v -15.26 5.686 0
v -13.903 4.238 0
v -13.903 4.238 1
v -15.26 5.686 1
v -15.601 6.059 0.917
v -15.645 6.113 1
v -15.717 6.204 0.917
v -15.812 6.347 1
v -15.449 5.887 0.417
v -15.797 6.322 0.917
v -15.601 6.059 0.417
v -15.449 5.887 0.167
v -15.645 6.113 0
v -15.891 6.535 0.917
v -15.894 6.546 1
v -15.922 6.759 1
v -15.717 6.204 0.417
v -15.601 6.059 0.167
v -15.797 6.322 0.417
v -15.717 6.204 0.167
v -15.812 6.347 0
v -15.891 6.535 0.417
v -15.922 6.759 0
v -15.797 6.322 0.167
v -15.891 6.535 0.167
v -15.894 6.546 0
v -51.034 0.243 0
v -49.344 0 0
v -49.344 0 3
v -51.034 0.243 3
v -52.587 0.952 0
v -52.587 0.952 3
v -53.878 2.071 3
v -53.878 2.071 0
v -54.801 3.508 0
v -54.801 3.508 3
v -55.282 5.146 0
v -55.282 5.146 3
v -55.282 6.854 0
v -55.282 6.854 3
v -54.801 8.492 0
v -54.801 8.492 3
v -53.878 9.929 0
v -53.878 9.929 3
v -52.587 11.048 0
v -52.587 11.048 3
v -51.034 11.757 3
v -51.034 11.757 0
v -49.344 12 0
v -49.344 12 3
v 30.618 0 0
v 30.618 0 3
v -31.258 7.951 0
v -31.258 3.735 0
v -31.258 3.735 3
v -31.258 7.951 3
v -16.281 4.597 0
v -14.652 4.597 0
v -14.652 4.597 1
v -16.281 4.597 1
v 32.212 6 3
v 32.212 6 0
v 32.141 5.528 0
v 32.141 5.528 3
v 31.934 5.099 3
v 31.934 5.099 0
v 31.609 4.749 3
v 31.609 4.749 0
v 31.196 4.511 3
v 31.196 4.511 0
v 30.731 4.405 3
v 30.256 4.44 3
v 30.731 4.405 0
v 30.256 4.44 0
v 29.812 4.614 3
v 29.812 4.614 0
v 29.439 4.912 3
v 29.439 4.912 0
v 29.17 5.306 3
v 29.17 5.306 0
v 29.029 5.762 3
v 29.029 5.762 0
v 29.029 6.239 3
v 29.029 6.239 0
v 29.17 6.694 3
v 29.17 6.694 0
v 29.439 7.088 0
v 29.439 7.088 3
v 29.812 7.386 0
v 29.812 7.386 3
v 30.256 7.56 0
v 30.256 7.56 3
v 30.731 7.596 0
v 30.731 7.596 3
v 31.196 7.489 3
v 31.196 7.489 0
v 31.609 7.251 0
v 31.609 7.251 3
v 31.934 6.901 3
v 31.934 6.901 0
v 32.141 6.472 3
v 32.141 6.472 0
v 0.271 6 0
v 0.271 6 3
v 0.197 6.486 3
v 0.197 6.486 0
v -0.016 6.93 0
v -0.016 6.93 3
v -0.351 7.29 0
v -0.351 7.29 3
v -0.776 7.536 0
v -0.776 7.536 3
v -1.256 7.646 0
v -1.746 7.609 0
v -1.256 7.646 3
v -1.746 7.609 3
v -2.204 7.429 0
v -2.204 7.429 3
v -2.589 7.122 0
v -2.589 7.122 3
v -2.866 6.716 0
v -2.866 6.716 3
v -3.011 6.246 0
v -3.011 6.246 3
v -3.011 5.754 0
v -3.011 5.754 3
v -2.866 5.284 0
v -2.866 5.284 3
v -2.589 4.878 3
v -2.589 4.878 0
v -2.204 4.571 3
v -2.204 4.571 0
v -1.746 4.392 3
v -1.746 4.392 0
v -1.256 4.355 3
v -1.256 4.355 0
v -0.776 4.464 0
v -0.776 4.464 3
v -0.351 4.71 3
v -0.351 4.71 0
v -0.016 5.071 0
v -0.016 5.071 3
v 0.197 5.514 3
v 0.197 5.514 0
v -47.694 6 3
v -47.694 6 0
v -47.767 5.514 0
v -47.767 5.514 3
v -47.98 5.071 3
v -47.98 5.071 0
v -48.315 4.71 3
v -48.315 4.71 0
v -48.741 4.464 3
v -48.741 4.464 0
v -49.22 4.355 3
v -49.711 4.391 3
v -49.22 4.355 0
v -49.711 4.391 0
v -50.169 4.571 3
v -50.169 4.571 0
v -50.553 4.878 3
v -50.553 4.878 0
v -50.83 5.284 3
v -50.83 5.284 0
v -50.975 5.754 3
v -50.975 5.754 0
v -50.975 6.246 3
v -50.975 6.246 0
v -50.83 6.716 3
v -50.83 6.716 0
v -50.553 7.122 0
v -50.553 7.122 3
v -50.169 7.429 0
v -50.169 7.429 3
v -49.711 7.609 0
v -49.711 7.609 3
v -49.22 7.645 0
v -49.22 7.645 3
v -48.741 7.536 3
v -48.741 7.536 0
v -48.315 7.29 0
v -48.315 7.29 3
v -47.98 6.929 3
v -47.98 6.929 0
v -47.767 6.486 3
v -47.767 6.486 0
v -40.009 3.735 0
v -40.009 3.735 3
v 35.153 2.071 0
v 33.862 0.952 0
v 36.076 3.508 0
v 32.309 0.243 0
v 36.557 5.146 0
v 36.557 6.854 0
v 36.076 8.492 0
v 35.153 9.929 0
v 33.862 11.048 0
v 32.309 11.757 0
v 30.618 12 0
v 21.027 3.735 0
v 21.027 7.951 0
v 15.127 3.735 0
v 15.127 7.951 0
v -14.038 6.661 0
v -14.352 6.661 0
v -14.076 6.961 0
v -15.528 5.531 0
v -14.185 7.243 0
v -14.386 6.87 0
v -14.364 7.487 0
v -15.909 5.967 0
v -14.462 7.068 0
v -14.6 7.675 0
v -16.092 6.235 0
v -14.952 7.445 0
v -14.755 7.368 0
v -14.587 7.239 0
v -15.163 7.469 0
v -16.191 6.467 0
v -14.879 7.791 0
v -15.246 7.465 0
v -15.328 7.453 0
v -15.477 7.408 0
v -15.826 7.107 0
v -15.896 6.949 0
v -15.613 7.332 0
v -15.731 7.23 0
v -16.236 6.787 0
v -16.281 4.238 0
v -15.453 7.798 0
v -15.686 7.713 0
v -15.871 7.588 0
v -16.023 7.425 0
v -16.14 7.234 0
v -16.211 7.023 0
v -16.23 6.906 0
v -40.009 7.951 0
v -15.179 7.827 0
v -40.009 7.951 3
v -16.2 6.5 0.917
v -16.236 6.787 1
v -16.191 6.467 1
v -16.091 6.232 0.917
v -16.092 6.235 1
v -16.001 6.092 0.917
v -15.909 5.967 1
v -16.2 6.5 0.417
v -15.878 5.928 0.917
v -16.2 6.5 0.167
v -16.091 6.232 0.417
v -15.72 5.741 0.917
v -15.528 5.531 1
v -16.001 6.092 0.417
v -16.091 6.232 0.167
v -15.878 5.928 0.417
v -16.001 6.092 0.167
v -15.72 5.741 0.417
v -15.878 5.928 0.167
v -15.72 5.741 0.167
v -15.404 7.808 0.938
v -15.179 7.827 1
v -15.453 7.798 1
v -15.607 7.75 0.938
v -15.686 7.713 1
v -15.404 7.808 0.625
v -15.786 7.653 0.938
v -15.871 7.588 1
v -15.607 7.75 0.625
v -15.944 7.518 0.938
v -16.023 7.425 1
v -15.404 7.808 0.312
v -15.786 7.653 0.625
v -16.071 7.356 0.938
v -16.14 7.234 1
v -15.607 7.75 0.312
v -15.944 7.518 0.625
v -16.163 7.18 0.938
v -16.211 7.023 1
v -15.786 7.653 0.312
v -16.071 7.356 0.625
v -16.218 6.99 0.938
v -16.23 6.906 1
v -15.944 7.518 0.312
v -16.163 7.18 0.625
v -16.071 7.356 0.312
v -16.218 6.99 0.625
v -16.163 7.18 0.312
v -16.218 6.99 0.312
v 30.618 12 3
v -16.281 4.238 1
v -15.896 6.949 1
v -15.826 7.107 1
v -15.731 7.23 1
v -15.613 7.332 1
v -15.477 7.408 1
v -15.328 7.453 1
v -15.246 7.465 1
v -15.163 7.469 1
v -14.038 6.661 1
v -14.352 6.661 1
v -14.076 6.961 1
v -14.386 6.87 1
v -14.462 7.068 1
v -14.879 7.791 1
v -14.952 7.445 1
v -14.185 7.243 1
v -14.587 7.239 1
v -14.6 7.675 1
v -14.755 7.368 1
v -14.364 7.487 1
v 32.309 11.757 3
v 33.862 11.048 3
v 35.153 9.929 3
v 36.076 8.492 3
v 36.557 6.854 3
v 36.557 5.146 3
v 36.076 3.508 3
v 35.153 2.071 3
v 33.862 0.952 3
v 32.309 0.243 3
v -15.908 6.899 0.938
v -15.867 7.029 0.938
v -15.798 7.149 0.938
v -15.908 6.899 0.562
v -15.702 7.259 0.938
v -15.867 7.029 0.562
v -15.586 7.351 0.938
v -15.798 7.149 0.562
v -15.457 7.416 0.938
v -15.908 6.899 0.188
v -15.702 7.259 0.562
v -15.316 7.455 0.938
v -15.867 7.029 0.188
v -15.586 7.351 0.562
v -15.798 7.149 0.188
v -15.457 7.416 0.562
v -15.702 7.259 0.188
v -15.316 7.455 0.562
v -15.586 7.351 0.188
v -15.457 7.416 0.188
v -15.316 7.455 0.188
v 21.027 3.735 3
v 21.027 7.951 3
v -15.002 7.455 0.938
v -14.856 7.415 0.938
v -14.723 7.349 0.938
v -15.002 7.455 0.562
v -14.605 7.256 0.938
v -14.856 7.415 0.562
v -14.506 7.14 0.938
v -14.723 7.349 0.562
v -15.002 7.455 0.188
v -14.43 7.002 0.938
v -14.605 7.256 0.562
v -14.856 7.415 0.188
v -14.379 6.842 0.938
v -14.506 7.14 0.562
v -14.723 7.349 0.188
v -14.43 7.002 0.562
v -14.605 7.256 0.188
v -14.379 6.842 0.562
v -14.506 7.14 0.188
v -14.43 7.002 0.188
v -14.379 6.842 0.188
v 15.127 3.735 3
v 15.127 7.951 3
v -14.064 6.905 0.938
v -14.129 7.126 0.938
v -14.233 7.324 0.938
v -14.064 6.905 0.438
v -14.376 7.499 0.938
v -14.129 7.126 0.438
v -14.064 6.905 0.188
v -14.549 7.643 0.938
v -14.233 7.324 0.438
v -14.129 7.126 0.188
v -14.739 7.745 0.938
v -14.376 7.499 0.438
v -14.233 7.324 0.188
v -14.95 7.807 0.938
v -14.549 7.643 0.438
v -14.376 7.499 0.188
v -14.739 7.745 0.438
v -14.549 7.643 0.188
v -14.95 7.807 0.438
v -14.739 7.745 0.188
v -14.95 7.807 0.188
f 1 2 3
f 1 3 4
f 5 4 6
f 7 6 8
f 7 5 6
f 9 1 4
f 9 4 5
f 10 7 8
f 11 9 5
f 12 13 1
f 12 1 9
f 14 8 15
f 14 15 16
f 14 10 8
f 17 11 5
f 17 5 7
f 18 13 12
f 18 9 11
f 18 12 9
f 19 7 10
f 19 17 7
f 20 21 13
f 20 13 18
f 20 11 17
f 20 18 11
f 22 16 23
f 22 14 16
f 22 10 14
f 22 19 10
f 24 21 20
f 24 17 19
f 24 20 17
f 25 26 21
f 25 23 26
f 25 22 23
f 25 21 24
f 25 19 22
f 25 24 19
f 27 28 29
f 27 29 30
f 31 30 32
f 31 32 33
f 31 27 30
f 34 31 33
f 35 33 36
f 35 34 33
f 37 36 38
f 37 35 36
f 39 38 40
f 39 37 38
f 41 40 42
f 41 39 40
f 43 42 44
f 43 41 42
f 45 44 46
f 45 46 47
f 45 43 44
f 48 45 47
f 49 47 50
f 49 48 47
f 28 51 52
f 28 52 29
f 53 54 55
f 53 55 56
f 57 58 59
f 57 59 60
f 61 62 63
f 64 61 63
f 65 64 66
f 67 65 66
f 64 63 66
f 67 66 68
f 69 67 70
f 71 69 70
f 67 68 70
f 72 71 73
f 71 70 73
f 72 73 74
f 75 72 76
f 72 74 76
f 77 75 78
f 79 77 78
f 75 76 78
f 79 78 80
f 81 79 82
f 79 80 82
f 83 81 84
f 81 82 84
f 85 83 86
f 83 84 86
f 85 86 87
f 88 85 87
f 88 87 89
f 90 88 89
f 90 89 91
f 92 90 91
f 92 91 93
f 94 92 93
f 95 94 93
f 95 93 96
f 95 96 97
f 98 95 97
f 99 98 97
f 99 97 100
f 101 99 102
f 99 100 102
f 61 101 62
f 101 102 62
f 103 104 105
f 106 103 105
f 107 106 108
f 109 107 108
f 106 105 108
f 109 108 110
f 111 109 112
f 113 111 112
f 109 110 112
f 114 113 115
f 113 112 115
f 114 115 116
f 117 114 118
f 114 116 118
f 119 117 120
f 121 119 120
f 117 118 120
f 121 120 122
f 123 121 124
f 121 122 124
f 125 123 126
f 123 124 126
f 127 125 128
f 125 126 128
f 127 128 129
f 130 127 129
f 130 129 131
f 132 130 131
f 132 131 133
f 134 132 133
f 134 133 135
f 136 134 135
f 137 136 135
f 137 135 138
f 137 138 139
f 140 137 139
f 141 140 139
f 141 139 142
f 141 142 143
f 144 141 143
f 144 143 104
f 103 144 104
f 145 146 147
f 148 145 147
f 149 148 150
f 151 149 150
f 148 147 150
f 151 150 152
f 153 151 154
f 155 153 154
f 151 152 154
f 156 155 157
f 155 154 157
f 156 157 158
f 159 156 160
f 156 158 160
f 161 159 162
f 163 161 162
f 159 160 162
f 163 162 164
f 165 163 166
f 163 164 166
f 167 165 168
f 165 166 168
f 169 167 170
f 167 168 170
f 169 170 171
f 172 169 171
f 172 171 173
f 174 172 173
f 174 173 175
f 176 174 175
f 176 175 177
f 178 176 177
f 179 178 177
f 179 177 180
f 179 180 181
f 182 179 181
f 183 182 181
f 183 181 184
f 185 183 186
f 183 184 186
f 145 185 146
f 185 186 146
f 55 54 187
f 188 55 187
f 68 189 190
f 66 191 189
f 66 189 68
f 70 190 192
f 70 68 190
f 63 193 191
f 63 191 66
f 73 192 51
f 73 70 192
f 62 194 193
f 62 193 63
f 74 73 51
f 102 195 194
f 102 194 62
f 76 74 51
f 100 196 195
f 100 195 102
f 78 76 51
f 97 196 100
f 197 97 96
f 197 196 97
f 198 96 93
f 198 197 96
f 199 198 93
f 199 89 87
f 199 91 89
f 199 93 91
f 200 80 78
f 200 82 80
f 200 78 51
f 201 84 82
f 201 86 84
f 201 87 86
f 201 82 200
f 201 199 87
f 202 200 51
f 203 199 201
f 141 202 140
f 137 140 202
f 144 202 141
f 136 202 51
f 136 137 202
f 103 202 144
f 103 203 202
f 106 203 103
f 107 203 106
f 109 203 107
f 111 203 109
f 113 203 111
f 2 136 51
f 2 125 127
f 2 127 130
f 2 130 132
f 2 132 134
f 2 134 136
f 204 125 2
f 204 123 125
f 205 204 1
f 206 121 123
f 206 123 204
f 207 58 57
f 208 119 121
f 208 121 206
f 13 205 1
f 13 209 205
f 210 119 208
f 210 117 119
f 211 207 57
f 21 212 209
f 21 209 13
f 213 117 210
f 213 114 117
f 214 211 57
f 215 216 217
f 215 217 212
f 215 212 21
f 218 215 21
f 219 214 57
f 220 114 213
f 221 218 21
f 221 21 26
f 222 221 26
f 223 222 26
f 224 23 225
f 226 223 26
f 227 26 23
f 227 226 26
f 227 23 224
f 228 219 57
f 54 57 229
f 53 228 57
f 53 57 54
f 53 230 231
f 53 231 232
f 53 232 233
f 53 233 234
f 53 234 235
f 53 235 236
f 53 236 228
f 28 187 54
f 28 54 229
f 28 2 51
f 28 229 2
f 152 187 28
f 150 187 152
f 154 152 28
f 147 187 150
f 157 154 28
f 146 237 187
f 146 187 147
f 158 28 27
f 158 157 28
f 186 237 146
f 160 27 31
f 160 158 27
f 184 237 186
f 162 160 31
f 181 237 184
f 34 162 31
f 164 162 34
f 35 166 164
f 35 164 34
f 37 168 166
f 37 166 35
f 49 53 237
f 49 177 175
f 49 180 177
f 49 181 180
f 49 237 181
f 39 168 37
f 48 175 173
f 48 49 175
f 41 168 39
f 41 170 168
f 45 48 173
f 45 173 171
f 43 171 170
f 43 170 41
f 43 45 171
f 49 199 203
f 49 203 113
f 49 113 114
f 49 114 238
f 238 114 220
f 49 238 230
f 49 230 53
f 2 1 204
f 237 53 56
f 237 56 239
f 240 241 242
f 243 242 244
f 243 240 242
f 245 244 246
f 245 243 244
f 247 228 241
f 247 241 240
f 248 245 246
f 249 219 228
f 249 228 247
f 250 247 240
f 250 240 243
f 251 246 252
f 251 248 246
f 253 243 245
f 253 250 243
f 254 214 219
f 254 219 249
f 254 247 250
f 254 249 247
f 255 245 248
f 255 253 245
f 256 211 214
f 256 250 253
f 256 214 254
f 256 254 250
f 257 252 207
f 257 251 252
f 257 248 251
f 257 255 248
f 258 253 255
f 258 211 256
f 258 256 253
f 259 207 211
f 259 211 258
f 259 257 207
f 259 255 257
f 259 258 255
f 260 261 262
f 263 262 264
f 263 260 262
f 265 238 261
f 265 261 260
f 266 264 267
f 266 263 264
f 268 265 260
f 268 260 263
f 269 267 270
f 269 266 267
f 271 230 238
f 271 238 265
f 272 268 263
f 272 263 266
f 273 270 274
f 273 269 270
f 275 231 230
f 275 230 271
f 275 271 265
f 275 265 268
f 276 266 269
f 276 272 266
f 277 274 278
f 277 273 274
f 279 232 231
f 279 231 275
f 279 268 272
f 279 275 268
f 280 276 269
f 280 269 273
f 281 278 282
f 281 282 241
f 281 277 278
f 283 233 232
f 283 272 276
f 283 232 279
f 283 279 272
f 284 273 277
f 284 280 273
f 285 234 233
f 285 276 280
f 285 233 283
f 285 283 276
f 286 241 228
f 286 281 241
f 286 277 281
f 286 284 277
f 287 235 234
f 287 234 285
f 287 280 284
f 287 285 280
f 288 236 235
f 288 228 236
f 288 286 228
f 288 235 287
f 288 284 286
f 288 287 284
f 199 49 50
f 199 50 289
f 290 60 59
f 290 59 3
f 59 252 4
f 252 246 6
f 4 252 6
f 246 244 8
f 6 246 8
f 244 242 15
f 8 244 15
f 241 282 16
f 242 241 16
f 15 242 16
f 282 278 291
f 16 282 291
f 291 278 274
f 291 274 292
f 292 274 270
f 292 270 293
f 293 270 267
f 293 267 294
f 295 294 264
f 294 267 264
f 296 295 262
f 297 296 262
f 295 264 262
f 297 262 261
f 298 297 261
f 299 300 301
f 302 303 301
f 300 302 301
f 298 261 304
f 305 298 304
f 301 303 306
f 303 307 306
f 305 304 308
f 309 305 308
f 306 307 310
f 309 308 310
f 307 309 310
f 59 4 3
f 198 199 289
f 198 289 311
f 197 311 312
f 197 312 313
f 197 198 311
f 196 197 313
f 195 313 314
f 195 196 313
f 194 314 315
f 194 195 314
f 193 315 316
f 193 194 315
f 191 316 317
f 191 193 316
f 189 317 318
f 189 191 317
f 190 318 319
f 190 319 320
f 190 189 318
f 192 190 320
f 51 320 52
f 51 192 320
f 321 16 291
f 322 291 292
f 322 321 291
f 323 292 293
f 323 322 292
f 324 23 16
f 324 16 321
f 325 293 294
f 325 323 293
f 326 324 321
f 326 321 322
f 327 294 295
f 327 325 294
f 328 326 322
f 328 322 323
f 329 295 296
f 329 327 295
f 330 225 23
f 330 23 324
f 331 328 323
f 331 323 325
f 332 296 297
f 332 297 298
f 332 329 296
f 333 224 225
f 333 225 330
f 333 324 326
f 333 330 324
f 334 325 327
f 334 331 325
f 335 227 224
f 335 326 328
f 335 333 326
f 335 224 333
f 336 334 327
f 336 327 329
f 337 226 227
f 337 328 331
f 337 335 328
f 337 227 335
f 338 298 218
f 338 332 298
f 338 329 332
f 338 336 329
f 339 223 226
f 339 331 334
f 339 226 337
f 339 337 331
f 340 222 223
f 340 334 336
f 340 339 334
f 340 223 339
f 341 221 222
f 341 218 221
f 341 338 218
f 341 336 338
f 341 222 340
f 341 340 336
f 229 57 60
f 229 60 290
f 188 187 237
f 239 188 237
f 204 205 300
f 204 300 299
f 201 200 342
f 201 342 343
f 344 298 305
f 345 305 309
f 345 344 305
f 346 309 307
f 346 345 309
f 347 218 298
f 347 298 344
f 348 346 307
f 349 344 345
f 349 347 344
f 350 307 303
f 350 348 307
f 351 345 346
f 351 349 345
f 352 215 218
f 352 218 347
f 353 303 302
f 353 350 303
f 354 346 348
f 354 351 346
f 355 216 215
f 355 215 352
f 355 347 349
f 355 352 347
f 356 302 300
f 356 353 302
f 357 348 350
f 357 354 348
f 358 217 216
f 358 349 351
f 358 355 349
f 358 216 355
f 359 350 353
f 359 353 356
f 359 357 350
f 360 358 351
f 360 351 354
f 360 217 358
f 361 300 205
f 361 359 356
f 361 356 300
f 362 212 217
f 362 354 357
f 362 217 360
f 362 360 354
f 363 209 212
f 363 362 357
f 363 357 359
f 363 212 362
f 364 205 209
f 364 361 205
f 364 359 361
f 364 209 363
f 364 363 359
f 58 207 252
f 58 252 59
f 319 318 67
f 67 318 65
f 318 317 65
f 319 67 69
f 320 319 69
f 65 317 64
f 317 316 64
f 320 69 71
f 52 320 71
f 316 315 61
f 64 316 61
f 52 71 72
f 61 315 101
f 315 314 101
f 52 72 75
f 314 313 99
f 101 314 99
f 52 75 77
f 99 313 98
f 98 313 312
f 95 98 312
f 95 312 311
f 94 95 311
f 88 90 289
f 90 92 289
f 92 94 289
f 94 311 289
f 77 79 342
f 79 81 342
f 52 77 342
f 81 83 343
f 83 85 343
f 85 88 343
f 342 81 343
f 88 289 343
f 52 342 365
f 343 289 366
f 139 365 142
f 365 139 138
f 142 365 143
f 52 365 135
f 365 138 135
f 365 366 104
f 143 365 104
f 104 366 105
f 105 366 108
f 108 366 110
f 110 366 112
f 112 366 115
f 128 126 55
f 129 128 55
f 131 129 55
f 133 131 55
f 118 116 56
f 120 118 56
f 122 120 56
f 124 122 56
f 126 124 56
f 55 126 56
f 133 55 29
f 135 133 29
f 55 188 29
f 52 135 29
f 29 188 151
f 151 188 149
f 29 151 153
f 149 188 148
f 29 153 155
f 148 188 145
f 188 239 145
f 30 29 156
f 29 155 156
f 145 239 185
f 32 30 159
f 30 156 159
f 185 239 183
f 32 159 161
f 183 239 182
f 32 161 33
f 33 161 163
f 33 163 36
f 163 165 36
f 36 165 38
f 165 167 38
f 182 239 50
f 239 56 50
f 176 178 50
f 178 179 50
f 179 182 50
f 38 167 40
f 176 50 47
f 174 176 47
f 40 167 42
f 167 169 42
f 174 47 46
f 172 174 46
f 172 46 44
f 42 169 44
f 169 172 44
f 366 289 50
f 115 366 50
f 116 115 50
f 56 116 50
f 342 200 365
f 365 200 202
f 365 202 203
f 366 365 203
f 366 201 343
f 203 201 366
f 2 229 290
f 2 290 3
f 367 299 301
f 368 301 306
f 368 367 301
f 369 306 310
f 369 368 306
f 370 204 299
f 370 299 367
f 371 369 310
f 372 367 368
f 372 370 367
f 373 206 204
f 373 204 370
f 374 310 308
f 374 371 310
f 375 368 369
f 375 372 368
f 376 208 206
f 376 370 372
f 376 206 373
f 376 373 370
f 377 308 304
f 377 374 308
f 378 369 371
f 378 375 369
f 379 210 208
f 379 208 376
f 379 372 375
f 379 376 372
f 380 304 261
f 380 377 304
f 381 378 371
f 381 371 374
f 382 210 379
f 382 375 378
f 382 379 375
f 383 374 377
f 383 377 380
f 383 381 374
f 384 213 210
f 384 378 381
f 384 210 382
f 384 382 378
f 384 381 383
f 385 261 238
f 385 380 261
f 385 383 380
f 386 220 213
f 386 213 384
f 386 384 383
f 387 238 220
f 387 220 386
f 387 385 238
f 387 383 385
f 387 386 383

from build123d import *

# Parameters (mm, degrees)
SKETCH_1_R          = 1.65
SKETCH_1_R_2        = 1.3
SKETCH_1_R_3        = 1.6
SKETCH_1_W          = 8.751182885
SKETCH_1_H          = 4.216885397
SKETCH_1_W_2        = 5.900028074
EXTRUDE_1_DEPTH     = 3
SKETCH_2_R          = 1.65
CUT_EXTRUDE_1_DEPTH = 57.708942736
CUT_EXTRUDE_3_DEPTH = 1


with BuildPart() as part:
    # 草图1 → 凸台-拉伸1 (new body)
    with BuildSketch(Plane(origin=(0, 0, 0), x_dir=(-1, 0, 0), z_dir=(0, 0, -1))):
        with BuildLine():
            Line((-30.618171933, 0), (49.343510787, 0))
            ThreePointArc((49.343510787, 0), (55.343510787, 6), (49.343510787, 12))
            Line((49.343510787, 12), (-30.618171933, 12))
            ThreePointArc((-30.618171933, 12), (-36.618171933, 6), (-30.618171933, 0))
        make_face()
        with Locations(Location((49.343510787, 6, 0), (0, 0, 180))):
            Circle(SKETCH_1_R, mode=Mode.SUBTRACT)
        with Locations(Location((1.379286828, 6.00015, 0), (0, 0, 180))):
            Circle(SKETCH_1_R_2, mode=Mode.SUBTRACT)
        with Locations(Location((-30.611606698, 6.0001, 0), (0, 0, 180))):
            Circle(SKETCH_1_R_3, mode=Mode.SUBTRACT)
        with Locations((35.633887137, 5.842992625)):
            Rectangle(SKETCH_1_W, SKETCH_1_H, mode=Mode.SUBTRACT)
        with Locations((-18.07705416, 5.842992625)):
            Rectangle(SKETCH_1_W_2, SKETCH_1_H, mode=Mode.SUBTRACT)
    extrude(amount=-EXTRUDE_1_DEPTH)

    # 草图2 → 切除-拉伸1 (cut, through all)
    with BuildSketch(Plane.XY.offset(3)):
        with Locations((-49.343510787, 6)):
            Circle(SKETCH_2_R)
        with Locations((-1.379286828, 6.00015)):
            Circle(SKETCH_2_R)
    extrude(amount=-CUT_EXTRUDE_1_DEPTH, mode=Mode.SUBTRACT)

    # 草图4 → 切除-拉伸3 (cut)
    with BuildSketch(Plane(origin=(0, 0, 0), x_dir=(-1, 0, 0), z_dir=(0, 0, -1))):
        with BuildLine():
            Line((14.3516244, 6.660828267), (14.037521836, 6.660828267))
            add(Edge.make_bspline(
                [(14.037521836, 6.660828267), (14.039568989, 6.702499155), (14.043589543, 6.78433967), (14.062417832, 6.903663576), (14.089358709, 7.017718375), (14.127450163, 7.125588289), (14.174756441, 7.228227096), (14.231486468, 7.325227112), (14.298680319, 7.4162183), (14.374887053, 7.500357144), (14.457655692, 7.577544715), (14.546961631, 7.644199957), (14.640806659, 7.700517629), (14.738906058, 7.747598871), (14.842366621, 7.782938716), (14.950249479, 7.809160356), (15.063028615, 7.824936702), (15.139868637, 7.826632487), (15.178948118, 7.827494934)],
                knots=[0, 0, 0, 0, 1.10065271, 2.161652631, 3.183658789, 4.190468796, 5.17591951, 6.163126047, 7.15150782, 8.156236427, 9.156009102, 10.134482811, 11.092018607, 12.041330605, 13.001268258, 13.972401359, 14.968799086, 16, 16, 16, 16], degree=3))
            add(Edge.make_bspline(
                [(15.178948118, 7.827494934), (15.217326192, 7.826596478), (15.292737736, 7.824831043), (15.402799751, 7.809670014), (15.507577045, 7.785924422), (15.606864812, 7.752609006), (15.699870876, 7.707824578), (15.787293921, 7.65402704), (15.870174732, 7.591807208), (15.944781515, 7.518553395), (16.013289595, 7.44035101), (16.07239185, 7.356863107), (16.123005013, 7.270633821), (16.165192693, 7.181005619), (16.196248832, 7.087134591), (16.21982704, 6.990387388), (16.233154454, 6.889762577), (16.235199877, 6.821656021), (16.236239784, 6.78703019)],
                knots=[0, 0, 0, 0, 1.111607364, 2.184268762, 3.212621178, 4.221274766, 5.211760367, 6.196651075, 7.1921475, 8.207485113, 9.220403448, 10.201281604, 11.166441695, 12.114753415, 13.065576456, 14.026450734, 14.996634279, 16, 16, 16, 16], degree=3))
            add(Edge.make_bspline(
                [(16.236239784, 6.78703019), (16.234546521, 6.738282356), (16.23118971, 6.641642142), (16.202475333, 6.499627279), (16.157628822, 6.36203386), (16.103631466, 6.251296558), (16.049159021, 6.162063065), (16.000071514, 6.08859436), (15.942606703, 6.009488891), (15.875928205, 5.925011554), (15.801415333, 5.834500649), (15.718393169, 5.738010853), (15.626269687, 5.636539084), (15.561611187, 5.567233482), (15.528106771, 5.531321056)],
                knots=[0, 0, 0, 0, 1.184426356, 2.348067706, 3.509069118, 4.696110526, 5.333549288, 6.050745305, 6.844228056, 7.710549037, 8.667450064, 9.695053472, 10.805634456, 12, 12, 12, 12], degree=3))
            Line((15.528106771, 5.531321056), (14.65240565, 4.596725703))
            Line((14.65240565, 4.596725703), (16.281111579, 4.596725703))
            Line((16.281111579, 4.596725703), (16.281111579, 4.237751344))
            Line((16.281111579, 4.237751344), (13.902906451, 4.237751344))
            Line((13.902906451, 4.237751344), (15.260278246, 5.686268973))
            add(Edge.make_bspline(
                [(15.260278246, 5.686268973), (15.293326133, 5.720767279), (15.35680436, 5.787031466), (15.446586937, 5.883774426), (15.527225925, 5.973523967), (15.599243318, 6.056110515), (15.661076823, 6.132742083), (15.715949055, 6.200936786), (15.759914646, 6.263691237), (15.807630042, 6.336431851), (15.853844023, 6.425244168), (15.893556379, 6.533777857), (15.917771227, 6.64550511), (15.920676063, 6.721007147), (15.92213722, 6.758985319)],
                knots=[0, 0, 0, 0, 1.329631726, 2.553950428, 3.673215718, 4.687767853, 5.603093632, 6.413772471, 7.123043292, 7.734684054, 8.834405432, 9.900288307, 10.943827018, 12, 12, 12, 12], degree=3))
            add(Edge.make_bspline(
                [(15.92213722, 6.758985319), (15.921501478, 6.782866717), (15.920248552, 6.829932367), (15.909190854, 6.898938126), (15.892480348, 6.96550294), (15.86853509, 7.029831559), (15.83692835, 7.091277211), (15.79845497, 7.149914692), (15.754064907, 7.206603657), (15.702713637, 7.259756955), (15.646302118, 7.30843816), (15.586707868, 7.351562246), (15.523657764, 7.387601357), (15.457417642, 7.417144854), (15.388172172, 7.440320235), (15.315787427, 7.456378814), (15.240463411, 7.466461298), (15.189029915, 7.46782547), (15.162822316, 7.468520575)],
                knots=[0, 0, 0, 0, 0.991446411, 1.95395049, 2.89581595, 3.838931463, 4.798493298, 5.75982156, 6.748411868, 7.785213223, 8.824556874, 9.840280684, 10.836137867, 11.835679398, 12.848801643, 13.863922112, 14.911575587, 16, 16, 16, 16], degree=3))
            add(Edge.make_bspline(
                [(15.162822316, 7.468520575), (15.135451484, 7.467805543), (15.081699687, 7.466401338), (15.002780654, 7.456578674), (14.927494877, 7.439632833), (14.855652974, 7.416456159), (14.787133388, 7.38699761), (14.722269344, 7.350305865), (14.661206455, 7.306522372), (14.603829931, 7.256881816), (14.550965952, 7.201614215), (14.504519077, 7.140004251), (14.463935062, 7.073176836), (14.428525829, 7.001312286), (14.399770139, 6.923758506), (14.377796988, 6.840790801), (14.360410142, 6.752769419), (14.354601621, 6.691984334), (14.3516244, 6.660828267)],
                knots=[0, 0, 0, 0, 1.031018746, 2.02475058, 2.990194455, 3.934040569, 4.864654155, 5.795059489, 6.735614925, 7.690564532, 8.649604399, 9.611025574, 10.590972636, 11.591080095, 12.624614302, 13.701020113, 14.821632451, 16, 16, 16, 16], degree=3))
        make_face()
    extrude(amount=-CUT_EXTRUDE_3_DEPTH, mode=Mode.SUBTRACT)


solid = part.part
